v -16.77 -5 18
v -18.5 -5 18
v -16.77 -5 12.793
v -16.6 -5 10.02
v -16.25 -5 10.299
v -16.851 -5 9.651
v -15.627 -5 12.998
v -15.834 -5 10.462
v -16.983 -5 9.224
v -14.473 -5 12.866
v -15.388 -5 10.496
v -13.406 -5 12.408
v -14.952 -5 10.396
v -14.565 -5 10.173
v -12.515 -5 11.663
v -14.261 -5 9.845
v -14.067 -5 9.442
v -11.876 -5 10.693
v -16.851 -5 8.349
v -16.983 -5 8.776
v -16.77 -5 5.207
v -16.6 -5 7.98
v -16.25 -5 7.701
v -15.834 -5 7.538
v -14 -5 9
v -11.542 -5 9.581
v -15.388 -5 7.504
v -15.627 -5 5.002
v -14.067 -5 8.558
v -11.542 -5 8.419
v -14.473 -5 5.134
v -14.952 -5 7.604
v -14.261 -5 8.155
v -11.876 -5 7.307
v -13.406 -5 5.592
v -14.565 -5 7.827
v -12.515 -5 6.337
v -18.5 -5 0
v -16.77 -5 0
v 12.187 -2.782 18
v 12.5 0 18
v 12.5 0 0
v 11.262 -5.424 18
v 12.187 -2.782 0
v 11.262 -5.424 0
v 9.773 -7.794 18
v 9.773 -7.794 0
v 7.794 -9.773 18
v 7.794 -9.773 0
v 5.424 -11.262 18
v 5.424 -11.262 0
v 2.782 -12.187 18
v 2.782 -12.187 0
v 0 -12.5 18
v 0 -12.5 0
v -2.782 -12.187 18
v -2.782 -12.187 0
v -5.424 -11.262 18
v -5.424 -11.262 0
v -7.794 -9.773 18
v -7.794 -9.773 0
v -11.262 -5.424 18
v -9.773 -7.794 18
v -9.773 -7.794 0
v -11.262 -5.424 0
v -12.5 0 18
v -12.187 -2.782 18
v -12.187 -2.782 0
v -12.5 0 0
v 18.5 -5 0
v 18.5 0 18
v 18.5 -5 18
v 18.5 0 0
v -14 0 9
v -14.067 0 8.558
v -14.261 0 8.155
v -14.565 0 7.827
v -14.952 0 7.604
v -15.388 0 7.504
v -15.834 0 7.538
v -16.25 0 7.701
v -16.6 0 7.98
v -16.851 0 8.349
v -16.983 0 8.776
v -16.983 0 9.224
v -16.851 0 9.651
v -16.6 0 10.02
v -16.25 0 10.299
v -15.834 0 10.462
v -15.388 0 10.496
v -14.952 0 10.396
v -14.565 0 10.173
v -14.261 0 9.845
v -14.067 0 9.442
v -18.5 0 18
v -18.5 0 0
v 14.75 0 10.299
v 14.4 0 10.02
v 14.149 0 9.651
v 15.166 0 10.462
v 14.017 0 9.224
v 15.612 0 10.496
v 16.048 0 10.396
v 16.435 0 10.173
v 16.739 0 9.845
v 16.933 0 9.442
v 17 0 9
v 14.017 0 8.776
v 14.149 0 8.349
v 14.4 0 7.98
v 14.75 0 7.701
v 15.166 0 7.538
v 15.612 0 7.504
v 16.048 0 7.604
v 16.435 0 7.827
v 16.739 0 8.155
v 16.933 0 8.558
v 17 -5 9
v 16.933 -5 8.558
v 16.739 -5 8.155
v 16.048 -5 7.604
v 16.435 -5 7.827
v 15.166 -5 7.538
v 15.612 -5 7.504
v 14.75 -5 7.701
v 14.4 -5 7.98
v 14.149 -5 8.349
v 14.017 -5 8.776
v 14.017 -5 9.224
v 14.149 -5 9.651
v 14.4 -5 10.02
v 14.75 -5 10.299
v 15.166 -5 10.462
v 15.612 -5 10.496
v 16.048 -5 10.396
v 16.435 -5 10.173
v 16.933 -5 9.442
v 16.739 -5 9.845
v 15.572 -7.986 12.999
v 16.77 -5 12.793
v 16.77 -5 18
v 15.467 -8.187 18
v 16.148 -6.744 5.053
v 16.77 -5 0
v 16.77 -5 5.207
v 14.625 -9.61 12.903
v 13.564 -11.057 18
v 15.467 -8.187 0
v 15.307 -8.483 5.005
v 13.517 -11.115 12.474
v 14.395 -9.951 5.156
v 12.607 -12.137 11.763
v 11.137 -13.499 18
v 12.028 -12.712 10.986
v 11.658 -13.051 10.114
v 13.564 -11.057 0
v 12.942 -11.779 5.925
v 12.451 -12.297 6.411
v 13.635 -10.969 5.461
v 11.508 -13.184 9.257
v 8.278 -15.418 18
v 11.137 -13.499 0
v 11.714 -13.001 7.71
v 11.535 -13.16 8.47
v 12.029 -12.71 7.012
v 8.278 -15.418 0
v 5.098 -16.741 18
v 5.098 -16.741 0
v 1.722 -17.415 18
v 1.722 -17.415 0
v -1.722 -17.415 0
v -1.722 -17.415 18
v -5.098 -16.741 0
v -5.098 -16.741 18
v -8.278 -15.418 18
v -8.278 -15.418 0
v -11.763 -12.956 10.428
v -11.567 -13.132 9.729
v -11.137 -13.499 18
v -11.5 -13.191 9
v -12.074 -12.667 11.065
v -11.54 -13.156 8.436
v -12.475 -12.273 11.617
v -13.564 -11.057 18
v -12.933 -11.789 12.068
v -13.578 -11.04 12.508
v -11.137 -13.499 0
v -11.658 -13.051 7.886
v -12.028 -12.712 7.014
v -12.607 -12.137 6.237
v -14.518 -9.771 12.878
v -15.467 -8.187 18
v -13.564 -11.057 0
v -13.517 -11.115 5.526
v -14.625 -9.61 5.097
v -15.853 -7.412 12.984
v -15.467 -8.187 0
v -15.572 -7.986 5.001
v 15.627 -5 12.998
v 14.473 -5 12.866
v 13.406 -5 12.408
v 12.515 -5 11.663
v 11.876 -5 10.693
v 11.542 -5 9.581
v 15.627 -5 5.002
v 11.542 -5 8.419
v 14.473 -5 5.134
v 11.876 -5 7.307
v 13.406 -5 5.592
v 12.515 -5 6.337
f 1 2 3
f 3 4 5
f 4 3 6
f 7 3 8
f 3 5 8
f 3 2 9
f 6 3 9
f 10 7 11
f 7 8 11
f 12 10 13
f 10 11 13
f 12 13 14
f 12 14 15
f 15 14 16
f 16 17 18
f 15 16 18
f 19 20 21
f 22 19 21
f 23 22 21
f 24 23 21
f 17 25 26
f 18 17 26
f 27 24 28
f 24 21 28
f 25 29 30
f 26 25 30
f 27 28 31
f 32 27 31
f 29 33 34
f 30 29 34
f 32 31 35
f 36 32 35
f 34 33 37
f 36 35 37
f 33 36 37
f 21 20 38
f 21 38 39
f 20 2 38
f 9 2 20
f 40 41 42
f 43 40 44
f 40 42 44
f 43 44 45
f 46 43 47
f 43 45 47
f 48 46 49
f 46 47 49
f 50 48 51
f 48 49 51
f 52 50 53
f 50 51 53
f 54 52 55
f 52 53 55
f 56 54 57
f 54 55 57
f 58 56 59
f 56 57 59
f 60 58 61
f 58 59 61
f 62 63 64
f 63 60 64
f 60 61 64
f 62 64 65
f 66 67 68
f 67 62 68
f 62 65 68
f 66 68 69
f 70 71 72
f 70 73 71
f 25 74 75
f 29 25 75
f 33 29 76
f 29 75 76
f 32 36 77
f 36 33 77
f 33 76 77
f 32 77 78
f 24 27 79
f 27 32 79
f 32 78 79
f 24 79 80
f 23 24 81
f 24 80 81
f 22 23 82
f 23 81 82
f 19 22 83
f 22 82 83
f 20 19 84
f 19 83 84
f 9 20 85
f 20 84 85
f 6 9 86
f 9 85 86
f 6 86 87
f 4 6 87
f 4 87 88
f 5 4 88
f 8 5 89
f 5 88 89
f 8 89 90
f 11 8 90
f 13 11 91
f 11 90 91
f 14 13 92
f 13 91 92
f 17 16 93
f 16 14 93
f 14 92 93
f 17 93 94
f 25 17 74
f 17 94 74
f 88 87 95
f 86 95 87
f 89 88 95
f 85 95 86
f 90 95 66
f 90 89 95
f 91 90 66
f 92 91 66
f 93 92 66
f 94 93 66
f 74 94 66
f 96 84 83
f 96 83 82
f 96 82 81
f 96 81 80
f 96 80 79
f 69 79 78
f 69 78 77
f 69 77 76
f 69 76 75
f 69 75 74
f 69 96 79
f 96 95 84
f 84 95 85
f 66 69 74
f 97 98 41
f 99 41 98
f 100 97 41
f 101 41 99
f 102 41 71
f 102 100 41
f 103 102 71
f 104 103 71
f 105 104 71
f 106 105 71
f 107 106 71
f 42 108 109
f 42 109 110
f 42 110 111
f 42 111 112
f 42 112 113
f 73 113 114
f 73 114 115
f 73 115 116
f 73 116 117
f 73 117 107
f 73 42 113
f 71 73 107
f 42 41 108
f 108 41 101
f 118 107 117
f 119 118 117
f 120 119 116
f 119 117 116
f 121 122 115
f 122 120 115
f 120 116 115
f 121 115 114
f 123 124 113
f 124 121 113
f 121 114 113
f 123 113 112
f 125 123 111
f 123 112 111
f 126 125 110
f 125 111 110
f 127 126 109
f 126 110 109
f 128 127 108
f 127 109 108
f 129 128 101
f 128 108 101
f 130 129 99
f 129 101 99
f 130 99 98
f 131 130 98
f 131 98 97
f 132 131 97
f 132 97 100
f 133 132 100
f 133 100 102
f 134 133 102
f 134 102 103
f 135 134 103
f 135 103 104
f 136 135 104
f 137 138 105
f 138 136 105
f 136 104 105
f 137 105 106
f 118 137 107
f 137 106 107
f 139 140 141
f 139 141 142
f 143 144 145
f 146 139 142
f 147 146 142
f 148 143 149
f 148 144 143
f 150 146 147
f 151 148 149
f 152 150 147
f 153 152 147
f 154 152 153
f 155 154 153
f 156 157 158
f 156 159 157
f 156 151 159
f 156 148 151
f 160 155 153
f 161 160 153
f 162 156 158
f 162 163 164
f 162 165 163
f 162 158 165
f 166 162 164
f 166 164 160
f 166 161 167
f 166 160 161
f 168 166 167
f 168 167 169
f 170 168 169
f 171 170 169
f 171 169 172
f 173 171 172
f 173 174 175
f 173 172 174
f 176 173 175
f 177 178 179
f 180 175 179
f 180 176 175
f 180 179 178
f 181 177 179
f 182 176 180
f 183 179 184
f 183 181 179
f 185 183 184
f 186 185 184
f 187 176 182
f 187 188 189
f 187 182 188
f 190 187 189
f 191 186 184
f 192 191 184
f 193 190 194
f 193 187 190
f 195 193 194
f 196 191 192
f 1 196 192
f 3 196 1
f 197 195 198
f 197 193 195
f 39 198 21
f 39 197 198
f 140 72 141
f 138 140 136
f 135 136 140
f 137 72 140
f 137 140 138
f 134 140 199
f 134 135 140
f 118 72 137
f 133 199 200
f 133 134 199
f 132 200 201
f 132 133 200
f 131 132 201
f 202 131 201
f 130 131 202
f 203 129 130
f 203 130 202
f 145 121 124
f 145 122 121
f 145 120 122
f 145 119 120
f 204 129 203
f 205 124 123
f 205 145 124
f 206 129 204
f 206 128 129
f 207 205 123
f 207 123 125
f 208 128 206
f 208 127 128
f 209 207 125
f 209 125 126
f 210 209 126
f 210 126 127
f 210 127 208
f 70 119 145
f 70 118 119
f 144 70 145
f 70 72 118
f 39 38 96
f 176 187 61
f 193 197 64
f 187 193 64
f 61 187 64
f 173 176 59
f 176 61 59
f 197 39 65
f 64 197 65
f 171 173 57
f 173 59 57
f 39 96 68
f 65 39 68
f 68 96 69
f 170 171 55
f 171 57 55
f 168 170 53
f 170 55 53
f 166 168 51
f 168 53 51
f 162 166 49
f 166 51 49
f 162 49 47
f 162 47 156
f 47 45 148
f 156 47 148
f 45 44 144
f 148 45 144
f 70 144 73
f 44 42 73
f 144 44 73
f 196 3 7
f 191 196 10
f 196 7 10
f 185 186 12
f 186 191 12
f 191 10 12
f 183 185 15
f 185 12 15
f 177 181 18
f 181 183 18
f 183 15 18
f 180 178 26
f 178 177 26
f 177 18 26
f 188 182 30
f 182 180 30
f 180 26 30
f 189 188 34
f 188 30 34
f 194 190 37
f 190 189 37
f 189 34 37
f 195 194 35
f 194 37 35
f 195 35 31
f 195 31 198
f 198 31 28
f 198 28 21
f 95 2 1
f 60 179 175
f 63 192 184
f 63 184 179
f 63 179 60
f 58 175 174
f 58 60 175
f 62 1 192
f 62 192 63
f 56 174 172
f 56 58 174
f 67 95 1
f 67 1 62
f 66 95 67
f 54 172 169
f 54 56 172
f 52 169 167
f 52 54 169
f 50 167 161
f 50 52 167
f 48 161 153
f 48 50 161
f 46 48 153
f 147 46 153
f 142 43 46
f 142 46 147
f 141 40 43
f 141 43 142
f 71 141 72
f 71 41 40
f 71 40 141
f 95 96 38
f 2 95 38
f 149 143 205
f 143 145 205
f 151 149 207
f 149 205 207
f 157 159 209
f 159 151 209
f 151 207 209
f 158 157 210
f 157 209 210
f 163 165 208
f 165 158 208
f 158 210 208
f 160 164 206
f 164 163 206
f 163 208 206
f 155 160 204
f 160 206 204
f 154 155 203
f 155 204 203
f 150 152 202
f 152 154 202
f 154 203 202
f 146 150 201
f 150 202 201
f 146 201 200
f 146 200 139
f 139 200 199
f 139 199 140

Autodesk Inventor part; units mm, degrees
ref_plane "YZ Plane" through (0, 0, 0) normal (1, 0, 0) x (0, 1, 0)
ref_plane "XZ Plane" through (0, 0, 0) normal (0, 1, 0) x (-1, 0, 0)
ref_plane "XY Plane" through (0, 0, 0) normal (0, 0, 1) x (1, 0, 0)
sketch "Sketch1" plane through (0, 0, 0) normal (0, 0, 1) x (1, 0, 0)
  arc A0 (-12.5, 0) -> (12.5, 0) centre (0, 0) ccw
  arc A1 (-16.7705, -5) -> (16.7705, -5) centre (0, 0) ccw
  line L0 (-16.5, 0) -> (-18.5, 0)
  line L1 (-18.5, 0) -> (-18.5, -5)
  line L2 (-18.5, -5) -> (-16.7705, -5)
  line L3 (16.5, 0) -> (18.5, 0)
  line L4 (18.5, 0) -> (18.5, -5)
  line L5 (18.5, -5) -> (16.7705, -5)
  line L6 (-16.5, 0) -> (-12.5, 0)
  line L7 (12.5, 0) -> (16.5, 0)
  point P0 (-17.5, 0)
  dimension "d0" = 25
  dimension "d2" = 5
  dimension "d3" = 2
  dimension "d4" = 5
  dimension "d22" = 6
extrude "Extrusion1" add sketch "Sketch1" along normal blind 18
sketch "Sketch2" plane through (-18.5, 0, 0) normal (0, 1, 0) x (1, 0, 0)
  circle A0 centre (3, -9) radius 1.5
  circle A1 centre (34, -9) radius 1.5
  line L0 (6, 0) -> (0, 0) projected
  line L1 (37, 0) -> (31, 0) projected
  line L2 (37, 0) -> (37, -18) projected
  line L3 (0, 0) -> (0, -18) projected
  line L4 (6, 0) -> (6, -18) projected
  line L5 (31, 0) -> (31, -18) projected
  point P0 (18.5, 0)
  dimension "d8" = 3
  dimension "d9" = 3
  dimension "d10" = 9
  dimension "d11" = 9
  dimension "d16" = 3
  dimension "d17" = 3
extrude "Extrusion2" cut sketch "Sketch2" against normal blind 18
sketch "Sketch3" plane through (-18.5, -5, 0) normal (0, -1, 0) x (1, 0, 0)
  circle A0 centre (3, 9) radius 1.5 projected
  circle A1 centre (3, 9) radius 4
  circle A2 centre (34, 9) radius 1.5 projected
  circle A3 centre (34, 9) radius 4
  point P0 (18.5, 0)
  dimension "d18" = 8
  dimension "d19" = 8
extrude "Extrusion3" cut sketch "Sketch3" along normal blind 10
properties part number "Clamp_Mount"
